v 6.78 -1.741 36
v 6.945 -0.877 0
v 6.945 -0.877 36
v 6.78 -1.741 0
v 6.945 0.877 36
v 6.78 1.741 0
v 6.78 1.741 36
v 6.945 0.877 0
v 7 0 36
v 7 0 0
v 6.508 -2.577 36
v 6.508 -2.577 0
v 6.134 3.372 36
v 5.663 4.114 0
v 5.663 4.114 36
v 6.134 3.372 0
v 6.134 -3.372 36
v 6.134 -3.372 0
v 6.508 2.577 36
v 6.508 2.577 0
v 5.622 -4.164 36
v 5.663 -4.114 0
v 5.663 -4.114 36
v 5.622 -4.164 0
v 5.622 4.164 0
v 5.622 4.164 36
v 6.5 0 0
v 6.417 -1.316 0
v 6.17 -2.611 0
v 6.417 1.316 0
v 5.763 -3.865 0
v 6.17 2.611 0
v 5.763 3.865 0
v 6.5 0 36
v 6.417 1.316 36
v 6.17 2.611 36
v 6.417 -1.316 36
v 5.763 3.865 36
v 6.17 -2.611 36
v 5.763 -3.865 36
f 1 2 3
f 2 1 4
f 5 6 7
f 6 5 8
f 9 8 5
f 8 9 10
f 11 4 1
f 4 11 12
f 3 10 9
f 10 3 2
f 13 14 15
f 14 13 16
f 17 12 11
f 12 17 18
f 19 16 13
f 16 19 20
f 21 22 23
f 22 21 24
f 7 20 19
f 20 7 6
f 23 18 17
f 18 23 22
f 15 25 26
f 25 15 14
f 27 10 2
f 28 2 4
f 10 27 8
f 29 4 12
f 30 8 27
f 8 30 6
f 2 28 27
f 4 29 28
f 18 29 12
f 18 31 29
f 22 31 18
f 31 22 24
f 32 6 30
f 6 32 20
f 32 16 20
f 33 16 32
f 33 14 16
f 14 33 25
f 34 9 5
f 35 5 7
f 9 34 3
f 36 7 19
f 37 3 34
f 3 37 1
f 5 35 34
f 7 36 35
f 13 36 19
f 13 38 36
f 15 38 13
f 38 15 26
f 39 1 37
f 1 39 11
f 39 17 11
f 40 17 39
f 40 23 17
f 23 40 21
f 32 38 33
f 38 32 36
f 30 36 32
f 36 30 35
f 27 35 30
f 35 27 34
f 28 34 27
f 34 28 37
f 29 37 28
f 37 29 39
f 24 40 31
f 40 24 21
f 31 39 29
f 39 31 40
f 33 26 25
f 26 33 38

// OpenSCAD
$fn = 50;


difference() {
	union() {
		cylinder(h = 36, r = 7.0000000000);
		translate(v = [-7.0000000000, 0, 0]) {
			cylinder(h = 36, r = 7.0000000000);
		}
	}
	union() {
		cylinder(h = 36, r = 3.2500000000);
		cylinder(h = 36, r = 1.8000000000);
		cylinder(h = 36, r = 1.8000000000);
		cylinder(h = 36, r = 1.8000000000);
		translate(v = [-11.5000000000, 0, 0]) {
			hull() {
				translate(v = [-3.7500000000, 0.0000000000, 0]) {
					cylinder(h = 36, r = 10.5000000000);
				}
				translate(v = [3.7500000000, 0.0000000000, 0]) {
					cylinder(h = 36, r = 10.5000000000);
				}
				translate(v = [-3.7500000000, -0.0000000000, 0]) {
					cylinder(h = 36, r = 10.5000000000);
				}
				translate(v = [3.7500000000, -0.0000000000, 0]) {
					cylinder(h = 36, r = 10.5000000000);
				}
			}
		}
		translate(v = [-4.0000000000, 0, 0.0000000000]) {
			cylinder(h = 36, r = 10.5000000000);
		}
	}
}
